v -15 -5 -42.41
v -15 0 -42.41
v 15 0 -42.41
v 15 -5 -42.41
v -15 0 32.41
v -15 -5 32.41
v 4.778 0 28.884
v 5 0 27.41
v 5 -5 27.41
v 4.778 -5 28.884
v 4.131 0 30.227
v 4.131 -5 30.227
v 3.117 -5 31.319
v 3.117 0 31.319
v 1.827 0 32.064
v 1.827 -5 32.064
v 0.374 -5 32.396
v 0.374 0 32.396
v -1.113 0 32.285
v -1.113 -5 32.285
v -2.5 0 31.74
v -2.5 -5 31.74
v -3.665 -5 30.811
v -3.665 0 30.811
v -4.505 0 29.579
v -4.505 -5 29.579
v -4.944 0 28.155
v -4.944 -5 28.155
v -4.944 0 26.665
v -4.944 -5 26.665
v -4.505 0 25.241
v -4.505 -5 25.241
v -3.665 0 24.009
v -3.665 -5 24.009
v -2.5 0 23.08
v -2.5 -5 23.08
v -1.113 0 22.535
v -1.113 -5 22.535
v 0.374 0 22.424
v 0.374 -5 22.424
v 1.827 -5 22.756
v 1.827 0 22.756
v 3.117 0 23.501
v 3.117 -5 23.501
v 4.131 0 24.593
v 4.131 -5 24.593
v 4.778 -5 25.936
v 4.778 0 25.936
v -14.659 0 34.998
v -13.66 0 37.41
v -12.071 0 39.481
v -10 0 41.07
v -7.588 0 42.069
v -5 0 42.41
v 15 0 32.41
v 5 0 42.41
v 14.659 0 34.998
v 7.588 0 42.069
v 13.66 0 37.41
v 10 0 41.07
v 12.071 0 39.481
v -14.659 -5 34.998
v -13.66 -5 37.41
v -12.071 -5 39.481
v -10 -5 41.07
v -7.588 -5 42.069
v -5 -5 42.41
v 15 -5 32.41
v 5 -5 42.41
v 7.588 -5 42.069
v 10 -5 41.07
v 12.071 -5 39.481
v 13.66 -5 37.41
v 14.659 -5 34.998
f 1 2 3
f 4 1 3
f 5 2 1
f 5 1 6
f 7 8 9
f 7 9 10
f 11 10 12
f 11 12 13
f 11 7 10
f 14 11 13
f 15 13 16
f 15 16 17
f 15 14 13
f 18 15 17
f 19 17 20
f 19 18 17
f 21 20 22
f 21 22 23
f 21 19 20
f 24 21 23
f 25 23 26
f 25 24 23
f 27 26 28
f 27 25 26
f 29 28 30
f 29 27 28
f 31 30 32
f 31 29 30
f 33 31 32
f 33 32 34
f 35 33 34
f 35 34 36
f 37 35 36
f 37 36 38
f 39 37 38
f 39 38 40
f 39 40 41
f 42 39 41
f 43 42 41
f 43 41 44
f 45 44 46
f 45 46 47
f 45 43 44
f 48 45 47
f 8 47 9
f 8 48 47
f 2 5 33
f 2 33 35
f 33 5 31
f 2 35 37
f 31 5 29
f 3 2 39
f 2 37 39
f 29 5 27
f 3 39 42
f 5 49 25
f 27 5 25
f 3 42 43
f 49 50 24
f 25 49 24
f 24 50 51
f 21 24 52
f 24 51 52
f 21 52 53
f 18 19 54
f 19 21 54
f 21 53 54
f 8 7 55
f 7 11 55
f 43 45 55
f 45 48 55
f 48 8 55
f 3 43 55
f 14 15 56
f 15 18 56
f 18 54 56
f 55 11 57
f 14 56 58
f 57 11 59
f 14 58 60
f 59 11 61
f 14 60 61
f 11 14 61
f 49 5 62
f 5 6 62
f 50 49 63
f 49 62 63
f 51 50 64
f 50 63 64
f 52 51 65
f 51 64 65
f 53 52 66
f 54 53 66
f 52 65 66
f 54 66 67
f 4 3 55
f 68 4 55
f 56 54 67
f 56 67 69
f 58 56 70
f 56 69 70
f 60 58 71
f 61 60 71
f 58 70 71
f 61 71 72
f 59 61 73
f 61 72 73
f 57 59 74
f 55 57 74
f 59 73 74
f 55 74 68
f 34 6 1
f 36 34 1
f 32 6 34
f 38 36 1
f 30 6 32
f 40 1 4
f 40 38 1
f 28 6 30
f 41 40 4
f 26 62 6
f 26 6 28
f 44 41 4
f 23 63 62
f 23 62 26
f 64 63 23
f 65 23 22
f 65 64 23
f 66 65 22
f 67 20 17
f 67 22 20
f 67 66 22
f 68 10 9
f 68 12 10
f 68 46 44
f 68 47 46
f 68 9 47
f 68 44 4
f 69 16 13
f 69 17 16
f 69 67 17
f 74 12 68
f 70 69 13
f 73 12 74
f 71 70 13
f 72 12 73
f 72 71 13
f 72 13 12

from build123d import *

# Parameters (mm, degrees)
F0_W     = 30
F0_H     = 84.82
F0_R     = 5
F1_DEPTH = 5
F2_R     = 10


with BuildPart() as f1:
    # F0 (on Front) → F1 (new body)
    with BuildSketch(Plane.XZ):
        Rectangle(F0_W, F0_H)
        with Locations((0, 27.41)):
            Circle(F0_R, mode=Mode.SUBTRACT)
    extrude(amount=F1_DEPTH)

    # F2
    f2_edges = [f1.edges().sort_by_distance(p)[0] for p in [
        (15, -2.5, 42.41),
        (-15, -2.5, 42.41),
    ]]
    fillet(f2_edges, radius=F2_R)


solid = f1.part
